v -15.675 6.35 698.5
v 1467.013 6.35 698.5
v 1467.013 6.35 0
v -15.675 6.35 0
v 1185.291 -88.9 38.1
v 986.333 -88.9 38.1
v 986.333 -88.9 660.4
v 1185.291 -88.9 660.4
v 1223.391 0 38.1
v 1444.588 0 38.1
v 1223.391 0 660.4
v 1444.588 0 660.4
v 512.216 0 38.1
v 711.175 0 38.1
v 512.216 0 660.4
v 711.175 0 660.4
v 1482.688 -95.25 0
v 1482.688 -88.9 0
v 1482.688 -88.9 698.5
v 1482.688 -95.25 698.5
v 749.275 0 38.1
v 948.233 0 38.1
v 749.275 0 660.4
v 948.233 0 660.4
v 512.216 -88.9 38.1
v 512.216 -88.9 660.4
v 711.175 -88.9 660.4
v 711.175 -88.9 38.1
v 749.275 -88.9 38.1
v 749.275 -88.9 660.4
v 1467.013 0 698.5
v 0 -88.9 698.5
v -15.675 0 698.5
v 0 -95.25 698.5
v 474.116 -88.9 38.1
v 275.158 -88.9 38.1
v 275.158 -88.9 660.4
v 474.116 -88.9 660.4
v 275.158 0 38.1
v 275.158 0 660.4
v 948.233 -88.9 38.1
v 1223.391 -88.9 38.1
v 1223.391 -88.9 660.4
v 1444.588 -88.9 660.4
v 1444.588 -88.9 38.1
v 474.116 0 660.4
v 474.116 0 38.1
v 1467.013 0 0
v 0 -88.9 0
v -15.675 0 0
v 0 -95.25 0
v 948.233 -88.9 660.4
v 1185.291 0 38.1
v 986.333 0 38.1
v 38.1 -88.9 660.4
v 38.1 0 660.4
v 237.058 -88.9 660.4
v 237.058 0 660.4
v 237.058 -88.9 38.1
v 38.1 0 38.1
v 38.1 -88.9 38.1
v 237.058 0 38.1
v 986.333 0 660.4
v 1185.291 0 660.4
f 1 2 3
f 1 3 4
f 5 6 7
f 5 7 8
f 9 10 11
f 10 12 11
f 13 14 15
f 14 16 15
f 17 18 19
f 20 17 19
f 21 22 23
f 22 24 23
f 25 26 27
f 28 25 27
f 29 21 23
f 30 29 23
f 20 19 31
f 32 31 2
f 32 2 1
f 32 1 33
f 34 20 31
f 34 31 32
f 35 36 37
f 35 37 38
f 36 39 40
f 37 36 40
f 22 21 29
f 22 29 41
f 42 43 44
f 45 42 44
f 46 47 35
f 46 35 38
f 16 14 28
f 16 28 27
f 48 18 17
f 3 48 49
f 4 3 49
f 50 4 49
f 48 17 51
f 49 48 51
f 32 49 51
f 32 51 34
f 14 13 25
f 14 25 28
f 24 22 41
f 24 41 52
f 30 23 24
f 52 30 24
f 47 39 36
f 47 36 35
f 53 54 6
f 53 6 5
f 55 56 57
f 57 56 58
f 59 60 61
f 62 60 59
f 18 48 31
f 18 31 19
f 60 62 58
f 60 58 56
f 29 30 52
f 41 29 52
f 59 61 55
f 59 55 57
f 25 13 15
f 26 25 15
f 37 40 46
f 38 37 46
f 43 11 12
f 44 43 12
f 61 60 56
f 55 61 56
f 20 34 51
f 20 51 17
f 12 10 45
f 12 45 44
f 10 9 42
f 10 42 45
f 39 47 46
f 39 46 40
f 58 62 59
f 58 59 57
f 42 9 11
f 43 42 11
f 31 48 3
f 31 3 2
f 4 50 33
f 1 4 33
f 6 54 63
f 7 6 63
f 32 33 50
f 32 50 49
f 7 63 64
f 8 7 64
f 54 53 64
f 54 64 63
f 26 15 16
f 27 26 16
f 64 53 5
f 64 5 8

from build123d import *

# Parameters (mm, degrees)
F0_W     = 198.9582
F0_H     = 622.3
F0_W_2   = 221.1972716
F1_DEPTH = 88.9
F3_DEPTH = 698.5
F5_DEPTH = 698.501
F6_W     = 1482.6882716
F6_H     = 698.5
F7_DEPTH = 6.35
F8_W     = 1482.6882716
F8_H     = 698.5
F9_DEPTH = 6.35


# Not quite as in the source:
# - a feature names something its author has since deleted; it is built from what else it names


with BuildPart() as f1:
    # F0 (on Front) → F1 (new body)
    with BuildSketch(Plane.XZ):
        Polygon((0, 38.1), (0, 0), (1482.6882716, 0), (1482.6882716, 38.1), (1482.6882716, 660.4), (1482.6882716, 698.5), (0, 698.5), (0, 660.4), align=None)
        with Locations((137.5791, 349.25)):
            Rectangle(F0_W, F0_H, mode=Mode.SUBTRACT)
        with Locations((374.6373, 349.25)):
            Rectangle(F0_W, F0_H, mode=Mode.SUBTRACT)
        with Locations((611.6955, 349.25)):
            Rectangle(F0_W, F0_H, mode=Mode.SUBTRACT)
        with Locations((848.7537, 349.25)):
            Rectangle(F0_W, F0_H, mode=Mode.SUBTRACT)
        with Locations((1085.8119, 349.25)):
            Rectangle(F0_W, F0_H, mode=Mode.SUBTRACT)
        with Locations((1333.9896358, 349.25)):
            Rectangle(F0_W_2, F0_H, mode=Mode.SUBTRACT)
    extrude(amount=F1_DEPTH)

    # F2 (on face) → F3 (join, through all)
    with BuildSketch(Plane.XY.offset(698.5)):
        Polygon((-15.675468585, 0), (0, -88.9), (0, 0), align=None)
    extrude(amount=-F3_DEPTH)

    # F4 (on face) → F5 (cut, through all)
    with BuildSketch(Plane.XY.offset(698.5)):
        Polygon((1467.012803015, 0), (1482.6882716, -88.9), (1482.6882716, 0), align=None)
    extrude(amount=-F5_DEPTH, mode=Mode.SUBTRACT)

    # F6 (on face) → F7 (join)
    with BuildSketch(Plane.XZ.offset(88.9)):
        with Locations((741.3441358, 349.25)):
            Rectangle(F6_W, F6_H)
    extrude(amount=F7_DEPTH)

    # F8 (on face) → F9 (join)
    with BuildSketch(Plane(origin=(0, 0, 0), x_dir=(-1, 0, 0), z_dir=(0, 1, 0))):
        with Locations((-725.668667215, 349.25)):
            Rectangle(F8_W, F8_H)
    extrude(amount=F9_DEPTH)


solid = f1.part
